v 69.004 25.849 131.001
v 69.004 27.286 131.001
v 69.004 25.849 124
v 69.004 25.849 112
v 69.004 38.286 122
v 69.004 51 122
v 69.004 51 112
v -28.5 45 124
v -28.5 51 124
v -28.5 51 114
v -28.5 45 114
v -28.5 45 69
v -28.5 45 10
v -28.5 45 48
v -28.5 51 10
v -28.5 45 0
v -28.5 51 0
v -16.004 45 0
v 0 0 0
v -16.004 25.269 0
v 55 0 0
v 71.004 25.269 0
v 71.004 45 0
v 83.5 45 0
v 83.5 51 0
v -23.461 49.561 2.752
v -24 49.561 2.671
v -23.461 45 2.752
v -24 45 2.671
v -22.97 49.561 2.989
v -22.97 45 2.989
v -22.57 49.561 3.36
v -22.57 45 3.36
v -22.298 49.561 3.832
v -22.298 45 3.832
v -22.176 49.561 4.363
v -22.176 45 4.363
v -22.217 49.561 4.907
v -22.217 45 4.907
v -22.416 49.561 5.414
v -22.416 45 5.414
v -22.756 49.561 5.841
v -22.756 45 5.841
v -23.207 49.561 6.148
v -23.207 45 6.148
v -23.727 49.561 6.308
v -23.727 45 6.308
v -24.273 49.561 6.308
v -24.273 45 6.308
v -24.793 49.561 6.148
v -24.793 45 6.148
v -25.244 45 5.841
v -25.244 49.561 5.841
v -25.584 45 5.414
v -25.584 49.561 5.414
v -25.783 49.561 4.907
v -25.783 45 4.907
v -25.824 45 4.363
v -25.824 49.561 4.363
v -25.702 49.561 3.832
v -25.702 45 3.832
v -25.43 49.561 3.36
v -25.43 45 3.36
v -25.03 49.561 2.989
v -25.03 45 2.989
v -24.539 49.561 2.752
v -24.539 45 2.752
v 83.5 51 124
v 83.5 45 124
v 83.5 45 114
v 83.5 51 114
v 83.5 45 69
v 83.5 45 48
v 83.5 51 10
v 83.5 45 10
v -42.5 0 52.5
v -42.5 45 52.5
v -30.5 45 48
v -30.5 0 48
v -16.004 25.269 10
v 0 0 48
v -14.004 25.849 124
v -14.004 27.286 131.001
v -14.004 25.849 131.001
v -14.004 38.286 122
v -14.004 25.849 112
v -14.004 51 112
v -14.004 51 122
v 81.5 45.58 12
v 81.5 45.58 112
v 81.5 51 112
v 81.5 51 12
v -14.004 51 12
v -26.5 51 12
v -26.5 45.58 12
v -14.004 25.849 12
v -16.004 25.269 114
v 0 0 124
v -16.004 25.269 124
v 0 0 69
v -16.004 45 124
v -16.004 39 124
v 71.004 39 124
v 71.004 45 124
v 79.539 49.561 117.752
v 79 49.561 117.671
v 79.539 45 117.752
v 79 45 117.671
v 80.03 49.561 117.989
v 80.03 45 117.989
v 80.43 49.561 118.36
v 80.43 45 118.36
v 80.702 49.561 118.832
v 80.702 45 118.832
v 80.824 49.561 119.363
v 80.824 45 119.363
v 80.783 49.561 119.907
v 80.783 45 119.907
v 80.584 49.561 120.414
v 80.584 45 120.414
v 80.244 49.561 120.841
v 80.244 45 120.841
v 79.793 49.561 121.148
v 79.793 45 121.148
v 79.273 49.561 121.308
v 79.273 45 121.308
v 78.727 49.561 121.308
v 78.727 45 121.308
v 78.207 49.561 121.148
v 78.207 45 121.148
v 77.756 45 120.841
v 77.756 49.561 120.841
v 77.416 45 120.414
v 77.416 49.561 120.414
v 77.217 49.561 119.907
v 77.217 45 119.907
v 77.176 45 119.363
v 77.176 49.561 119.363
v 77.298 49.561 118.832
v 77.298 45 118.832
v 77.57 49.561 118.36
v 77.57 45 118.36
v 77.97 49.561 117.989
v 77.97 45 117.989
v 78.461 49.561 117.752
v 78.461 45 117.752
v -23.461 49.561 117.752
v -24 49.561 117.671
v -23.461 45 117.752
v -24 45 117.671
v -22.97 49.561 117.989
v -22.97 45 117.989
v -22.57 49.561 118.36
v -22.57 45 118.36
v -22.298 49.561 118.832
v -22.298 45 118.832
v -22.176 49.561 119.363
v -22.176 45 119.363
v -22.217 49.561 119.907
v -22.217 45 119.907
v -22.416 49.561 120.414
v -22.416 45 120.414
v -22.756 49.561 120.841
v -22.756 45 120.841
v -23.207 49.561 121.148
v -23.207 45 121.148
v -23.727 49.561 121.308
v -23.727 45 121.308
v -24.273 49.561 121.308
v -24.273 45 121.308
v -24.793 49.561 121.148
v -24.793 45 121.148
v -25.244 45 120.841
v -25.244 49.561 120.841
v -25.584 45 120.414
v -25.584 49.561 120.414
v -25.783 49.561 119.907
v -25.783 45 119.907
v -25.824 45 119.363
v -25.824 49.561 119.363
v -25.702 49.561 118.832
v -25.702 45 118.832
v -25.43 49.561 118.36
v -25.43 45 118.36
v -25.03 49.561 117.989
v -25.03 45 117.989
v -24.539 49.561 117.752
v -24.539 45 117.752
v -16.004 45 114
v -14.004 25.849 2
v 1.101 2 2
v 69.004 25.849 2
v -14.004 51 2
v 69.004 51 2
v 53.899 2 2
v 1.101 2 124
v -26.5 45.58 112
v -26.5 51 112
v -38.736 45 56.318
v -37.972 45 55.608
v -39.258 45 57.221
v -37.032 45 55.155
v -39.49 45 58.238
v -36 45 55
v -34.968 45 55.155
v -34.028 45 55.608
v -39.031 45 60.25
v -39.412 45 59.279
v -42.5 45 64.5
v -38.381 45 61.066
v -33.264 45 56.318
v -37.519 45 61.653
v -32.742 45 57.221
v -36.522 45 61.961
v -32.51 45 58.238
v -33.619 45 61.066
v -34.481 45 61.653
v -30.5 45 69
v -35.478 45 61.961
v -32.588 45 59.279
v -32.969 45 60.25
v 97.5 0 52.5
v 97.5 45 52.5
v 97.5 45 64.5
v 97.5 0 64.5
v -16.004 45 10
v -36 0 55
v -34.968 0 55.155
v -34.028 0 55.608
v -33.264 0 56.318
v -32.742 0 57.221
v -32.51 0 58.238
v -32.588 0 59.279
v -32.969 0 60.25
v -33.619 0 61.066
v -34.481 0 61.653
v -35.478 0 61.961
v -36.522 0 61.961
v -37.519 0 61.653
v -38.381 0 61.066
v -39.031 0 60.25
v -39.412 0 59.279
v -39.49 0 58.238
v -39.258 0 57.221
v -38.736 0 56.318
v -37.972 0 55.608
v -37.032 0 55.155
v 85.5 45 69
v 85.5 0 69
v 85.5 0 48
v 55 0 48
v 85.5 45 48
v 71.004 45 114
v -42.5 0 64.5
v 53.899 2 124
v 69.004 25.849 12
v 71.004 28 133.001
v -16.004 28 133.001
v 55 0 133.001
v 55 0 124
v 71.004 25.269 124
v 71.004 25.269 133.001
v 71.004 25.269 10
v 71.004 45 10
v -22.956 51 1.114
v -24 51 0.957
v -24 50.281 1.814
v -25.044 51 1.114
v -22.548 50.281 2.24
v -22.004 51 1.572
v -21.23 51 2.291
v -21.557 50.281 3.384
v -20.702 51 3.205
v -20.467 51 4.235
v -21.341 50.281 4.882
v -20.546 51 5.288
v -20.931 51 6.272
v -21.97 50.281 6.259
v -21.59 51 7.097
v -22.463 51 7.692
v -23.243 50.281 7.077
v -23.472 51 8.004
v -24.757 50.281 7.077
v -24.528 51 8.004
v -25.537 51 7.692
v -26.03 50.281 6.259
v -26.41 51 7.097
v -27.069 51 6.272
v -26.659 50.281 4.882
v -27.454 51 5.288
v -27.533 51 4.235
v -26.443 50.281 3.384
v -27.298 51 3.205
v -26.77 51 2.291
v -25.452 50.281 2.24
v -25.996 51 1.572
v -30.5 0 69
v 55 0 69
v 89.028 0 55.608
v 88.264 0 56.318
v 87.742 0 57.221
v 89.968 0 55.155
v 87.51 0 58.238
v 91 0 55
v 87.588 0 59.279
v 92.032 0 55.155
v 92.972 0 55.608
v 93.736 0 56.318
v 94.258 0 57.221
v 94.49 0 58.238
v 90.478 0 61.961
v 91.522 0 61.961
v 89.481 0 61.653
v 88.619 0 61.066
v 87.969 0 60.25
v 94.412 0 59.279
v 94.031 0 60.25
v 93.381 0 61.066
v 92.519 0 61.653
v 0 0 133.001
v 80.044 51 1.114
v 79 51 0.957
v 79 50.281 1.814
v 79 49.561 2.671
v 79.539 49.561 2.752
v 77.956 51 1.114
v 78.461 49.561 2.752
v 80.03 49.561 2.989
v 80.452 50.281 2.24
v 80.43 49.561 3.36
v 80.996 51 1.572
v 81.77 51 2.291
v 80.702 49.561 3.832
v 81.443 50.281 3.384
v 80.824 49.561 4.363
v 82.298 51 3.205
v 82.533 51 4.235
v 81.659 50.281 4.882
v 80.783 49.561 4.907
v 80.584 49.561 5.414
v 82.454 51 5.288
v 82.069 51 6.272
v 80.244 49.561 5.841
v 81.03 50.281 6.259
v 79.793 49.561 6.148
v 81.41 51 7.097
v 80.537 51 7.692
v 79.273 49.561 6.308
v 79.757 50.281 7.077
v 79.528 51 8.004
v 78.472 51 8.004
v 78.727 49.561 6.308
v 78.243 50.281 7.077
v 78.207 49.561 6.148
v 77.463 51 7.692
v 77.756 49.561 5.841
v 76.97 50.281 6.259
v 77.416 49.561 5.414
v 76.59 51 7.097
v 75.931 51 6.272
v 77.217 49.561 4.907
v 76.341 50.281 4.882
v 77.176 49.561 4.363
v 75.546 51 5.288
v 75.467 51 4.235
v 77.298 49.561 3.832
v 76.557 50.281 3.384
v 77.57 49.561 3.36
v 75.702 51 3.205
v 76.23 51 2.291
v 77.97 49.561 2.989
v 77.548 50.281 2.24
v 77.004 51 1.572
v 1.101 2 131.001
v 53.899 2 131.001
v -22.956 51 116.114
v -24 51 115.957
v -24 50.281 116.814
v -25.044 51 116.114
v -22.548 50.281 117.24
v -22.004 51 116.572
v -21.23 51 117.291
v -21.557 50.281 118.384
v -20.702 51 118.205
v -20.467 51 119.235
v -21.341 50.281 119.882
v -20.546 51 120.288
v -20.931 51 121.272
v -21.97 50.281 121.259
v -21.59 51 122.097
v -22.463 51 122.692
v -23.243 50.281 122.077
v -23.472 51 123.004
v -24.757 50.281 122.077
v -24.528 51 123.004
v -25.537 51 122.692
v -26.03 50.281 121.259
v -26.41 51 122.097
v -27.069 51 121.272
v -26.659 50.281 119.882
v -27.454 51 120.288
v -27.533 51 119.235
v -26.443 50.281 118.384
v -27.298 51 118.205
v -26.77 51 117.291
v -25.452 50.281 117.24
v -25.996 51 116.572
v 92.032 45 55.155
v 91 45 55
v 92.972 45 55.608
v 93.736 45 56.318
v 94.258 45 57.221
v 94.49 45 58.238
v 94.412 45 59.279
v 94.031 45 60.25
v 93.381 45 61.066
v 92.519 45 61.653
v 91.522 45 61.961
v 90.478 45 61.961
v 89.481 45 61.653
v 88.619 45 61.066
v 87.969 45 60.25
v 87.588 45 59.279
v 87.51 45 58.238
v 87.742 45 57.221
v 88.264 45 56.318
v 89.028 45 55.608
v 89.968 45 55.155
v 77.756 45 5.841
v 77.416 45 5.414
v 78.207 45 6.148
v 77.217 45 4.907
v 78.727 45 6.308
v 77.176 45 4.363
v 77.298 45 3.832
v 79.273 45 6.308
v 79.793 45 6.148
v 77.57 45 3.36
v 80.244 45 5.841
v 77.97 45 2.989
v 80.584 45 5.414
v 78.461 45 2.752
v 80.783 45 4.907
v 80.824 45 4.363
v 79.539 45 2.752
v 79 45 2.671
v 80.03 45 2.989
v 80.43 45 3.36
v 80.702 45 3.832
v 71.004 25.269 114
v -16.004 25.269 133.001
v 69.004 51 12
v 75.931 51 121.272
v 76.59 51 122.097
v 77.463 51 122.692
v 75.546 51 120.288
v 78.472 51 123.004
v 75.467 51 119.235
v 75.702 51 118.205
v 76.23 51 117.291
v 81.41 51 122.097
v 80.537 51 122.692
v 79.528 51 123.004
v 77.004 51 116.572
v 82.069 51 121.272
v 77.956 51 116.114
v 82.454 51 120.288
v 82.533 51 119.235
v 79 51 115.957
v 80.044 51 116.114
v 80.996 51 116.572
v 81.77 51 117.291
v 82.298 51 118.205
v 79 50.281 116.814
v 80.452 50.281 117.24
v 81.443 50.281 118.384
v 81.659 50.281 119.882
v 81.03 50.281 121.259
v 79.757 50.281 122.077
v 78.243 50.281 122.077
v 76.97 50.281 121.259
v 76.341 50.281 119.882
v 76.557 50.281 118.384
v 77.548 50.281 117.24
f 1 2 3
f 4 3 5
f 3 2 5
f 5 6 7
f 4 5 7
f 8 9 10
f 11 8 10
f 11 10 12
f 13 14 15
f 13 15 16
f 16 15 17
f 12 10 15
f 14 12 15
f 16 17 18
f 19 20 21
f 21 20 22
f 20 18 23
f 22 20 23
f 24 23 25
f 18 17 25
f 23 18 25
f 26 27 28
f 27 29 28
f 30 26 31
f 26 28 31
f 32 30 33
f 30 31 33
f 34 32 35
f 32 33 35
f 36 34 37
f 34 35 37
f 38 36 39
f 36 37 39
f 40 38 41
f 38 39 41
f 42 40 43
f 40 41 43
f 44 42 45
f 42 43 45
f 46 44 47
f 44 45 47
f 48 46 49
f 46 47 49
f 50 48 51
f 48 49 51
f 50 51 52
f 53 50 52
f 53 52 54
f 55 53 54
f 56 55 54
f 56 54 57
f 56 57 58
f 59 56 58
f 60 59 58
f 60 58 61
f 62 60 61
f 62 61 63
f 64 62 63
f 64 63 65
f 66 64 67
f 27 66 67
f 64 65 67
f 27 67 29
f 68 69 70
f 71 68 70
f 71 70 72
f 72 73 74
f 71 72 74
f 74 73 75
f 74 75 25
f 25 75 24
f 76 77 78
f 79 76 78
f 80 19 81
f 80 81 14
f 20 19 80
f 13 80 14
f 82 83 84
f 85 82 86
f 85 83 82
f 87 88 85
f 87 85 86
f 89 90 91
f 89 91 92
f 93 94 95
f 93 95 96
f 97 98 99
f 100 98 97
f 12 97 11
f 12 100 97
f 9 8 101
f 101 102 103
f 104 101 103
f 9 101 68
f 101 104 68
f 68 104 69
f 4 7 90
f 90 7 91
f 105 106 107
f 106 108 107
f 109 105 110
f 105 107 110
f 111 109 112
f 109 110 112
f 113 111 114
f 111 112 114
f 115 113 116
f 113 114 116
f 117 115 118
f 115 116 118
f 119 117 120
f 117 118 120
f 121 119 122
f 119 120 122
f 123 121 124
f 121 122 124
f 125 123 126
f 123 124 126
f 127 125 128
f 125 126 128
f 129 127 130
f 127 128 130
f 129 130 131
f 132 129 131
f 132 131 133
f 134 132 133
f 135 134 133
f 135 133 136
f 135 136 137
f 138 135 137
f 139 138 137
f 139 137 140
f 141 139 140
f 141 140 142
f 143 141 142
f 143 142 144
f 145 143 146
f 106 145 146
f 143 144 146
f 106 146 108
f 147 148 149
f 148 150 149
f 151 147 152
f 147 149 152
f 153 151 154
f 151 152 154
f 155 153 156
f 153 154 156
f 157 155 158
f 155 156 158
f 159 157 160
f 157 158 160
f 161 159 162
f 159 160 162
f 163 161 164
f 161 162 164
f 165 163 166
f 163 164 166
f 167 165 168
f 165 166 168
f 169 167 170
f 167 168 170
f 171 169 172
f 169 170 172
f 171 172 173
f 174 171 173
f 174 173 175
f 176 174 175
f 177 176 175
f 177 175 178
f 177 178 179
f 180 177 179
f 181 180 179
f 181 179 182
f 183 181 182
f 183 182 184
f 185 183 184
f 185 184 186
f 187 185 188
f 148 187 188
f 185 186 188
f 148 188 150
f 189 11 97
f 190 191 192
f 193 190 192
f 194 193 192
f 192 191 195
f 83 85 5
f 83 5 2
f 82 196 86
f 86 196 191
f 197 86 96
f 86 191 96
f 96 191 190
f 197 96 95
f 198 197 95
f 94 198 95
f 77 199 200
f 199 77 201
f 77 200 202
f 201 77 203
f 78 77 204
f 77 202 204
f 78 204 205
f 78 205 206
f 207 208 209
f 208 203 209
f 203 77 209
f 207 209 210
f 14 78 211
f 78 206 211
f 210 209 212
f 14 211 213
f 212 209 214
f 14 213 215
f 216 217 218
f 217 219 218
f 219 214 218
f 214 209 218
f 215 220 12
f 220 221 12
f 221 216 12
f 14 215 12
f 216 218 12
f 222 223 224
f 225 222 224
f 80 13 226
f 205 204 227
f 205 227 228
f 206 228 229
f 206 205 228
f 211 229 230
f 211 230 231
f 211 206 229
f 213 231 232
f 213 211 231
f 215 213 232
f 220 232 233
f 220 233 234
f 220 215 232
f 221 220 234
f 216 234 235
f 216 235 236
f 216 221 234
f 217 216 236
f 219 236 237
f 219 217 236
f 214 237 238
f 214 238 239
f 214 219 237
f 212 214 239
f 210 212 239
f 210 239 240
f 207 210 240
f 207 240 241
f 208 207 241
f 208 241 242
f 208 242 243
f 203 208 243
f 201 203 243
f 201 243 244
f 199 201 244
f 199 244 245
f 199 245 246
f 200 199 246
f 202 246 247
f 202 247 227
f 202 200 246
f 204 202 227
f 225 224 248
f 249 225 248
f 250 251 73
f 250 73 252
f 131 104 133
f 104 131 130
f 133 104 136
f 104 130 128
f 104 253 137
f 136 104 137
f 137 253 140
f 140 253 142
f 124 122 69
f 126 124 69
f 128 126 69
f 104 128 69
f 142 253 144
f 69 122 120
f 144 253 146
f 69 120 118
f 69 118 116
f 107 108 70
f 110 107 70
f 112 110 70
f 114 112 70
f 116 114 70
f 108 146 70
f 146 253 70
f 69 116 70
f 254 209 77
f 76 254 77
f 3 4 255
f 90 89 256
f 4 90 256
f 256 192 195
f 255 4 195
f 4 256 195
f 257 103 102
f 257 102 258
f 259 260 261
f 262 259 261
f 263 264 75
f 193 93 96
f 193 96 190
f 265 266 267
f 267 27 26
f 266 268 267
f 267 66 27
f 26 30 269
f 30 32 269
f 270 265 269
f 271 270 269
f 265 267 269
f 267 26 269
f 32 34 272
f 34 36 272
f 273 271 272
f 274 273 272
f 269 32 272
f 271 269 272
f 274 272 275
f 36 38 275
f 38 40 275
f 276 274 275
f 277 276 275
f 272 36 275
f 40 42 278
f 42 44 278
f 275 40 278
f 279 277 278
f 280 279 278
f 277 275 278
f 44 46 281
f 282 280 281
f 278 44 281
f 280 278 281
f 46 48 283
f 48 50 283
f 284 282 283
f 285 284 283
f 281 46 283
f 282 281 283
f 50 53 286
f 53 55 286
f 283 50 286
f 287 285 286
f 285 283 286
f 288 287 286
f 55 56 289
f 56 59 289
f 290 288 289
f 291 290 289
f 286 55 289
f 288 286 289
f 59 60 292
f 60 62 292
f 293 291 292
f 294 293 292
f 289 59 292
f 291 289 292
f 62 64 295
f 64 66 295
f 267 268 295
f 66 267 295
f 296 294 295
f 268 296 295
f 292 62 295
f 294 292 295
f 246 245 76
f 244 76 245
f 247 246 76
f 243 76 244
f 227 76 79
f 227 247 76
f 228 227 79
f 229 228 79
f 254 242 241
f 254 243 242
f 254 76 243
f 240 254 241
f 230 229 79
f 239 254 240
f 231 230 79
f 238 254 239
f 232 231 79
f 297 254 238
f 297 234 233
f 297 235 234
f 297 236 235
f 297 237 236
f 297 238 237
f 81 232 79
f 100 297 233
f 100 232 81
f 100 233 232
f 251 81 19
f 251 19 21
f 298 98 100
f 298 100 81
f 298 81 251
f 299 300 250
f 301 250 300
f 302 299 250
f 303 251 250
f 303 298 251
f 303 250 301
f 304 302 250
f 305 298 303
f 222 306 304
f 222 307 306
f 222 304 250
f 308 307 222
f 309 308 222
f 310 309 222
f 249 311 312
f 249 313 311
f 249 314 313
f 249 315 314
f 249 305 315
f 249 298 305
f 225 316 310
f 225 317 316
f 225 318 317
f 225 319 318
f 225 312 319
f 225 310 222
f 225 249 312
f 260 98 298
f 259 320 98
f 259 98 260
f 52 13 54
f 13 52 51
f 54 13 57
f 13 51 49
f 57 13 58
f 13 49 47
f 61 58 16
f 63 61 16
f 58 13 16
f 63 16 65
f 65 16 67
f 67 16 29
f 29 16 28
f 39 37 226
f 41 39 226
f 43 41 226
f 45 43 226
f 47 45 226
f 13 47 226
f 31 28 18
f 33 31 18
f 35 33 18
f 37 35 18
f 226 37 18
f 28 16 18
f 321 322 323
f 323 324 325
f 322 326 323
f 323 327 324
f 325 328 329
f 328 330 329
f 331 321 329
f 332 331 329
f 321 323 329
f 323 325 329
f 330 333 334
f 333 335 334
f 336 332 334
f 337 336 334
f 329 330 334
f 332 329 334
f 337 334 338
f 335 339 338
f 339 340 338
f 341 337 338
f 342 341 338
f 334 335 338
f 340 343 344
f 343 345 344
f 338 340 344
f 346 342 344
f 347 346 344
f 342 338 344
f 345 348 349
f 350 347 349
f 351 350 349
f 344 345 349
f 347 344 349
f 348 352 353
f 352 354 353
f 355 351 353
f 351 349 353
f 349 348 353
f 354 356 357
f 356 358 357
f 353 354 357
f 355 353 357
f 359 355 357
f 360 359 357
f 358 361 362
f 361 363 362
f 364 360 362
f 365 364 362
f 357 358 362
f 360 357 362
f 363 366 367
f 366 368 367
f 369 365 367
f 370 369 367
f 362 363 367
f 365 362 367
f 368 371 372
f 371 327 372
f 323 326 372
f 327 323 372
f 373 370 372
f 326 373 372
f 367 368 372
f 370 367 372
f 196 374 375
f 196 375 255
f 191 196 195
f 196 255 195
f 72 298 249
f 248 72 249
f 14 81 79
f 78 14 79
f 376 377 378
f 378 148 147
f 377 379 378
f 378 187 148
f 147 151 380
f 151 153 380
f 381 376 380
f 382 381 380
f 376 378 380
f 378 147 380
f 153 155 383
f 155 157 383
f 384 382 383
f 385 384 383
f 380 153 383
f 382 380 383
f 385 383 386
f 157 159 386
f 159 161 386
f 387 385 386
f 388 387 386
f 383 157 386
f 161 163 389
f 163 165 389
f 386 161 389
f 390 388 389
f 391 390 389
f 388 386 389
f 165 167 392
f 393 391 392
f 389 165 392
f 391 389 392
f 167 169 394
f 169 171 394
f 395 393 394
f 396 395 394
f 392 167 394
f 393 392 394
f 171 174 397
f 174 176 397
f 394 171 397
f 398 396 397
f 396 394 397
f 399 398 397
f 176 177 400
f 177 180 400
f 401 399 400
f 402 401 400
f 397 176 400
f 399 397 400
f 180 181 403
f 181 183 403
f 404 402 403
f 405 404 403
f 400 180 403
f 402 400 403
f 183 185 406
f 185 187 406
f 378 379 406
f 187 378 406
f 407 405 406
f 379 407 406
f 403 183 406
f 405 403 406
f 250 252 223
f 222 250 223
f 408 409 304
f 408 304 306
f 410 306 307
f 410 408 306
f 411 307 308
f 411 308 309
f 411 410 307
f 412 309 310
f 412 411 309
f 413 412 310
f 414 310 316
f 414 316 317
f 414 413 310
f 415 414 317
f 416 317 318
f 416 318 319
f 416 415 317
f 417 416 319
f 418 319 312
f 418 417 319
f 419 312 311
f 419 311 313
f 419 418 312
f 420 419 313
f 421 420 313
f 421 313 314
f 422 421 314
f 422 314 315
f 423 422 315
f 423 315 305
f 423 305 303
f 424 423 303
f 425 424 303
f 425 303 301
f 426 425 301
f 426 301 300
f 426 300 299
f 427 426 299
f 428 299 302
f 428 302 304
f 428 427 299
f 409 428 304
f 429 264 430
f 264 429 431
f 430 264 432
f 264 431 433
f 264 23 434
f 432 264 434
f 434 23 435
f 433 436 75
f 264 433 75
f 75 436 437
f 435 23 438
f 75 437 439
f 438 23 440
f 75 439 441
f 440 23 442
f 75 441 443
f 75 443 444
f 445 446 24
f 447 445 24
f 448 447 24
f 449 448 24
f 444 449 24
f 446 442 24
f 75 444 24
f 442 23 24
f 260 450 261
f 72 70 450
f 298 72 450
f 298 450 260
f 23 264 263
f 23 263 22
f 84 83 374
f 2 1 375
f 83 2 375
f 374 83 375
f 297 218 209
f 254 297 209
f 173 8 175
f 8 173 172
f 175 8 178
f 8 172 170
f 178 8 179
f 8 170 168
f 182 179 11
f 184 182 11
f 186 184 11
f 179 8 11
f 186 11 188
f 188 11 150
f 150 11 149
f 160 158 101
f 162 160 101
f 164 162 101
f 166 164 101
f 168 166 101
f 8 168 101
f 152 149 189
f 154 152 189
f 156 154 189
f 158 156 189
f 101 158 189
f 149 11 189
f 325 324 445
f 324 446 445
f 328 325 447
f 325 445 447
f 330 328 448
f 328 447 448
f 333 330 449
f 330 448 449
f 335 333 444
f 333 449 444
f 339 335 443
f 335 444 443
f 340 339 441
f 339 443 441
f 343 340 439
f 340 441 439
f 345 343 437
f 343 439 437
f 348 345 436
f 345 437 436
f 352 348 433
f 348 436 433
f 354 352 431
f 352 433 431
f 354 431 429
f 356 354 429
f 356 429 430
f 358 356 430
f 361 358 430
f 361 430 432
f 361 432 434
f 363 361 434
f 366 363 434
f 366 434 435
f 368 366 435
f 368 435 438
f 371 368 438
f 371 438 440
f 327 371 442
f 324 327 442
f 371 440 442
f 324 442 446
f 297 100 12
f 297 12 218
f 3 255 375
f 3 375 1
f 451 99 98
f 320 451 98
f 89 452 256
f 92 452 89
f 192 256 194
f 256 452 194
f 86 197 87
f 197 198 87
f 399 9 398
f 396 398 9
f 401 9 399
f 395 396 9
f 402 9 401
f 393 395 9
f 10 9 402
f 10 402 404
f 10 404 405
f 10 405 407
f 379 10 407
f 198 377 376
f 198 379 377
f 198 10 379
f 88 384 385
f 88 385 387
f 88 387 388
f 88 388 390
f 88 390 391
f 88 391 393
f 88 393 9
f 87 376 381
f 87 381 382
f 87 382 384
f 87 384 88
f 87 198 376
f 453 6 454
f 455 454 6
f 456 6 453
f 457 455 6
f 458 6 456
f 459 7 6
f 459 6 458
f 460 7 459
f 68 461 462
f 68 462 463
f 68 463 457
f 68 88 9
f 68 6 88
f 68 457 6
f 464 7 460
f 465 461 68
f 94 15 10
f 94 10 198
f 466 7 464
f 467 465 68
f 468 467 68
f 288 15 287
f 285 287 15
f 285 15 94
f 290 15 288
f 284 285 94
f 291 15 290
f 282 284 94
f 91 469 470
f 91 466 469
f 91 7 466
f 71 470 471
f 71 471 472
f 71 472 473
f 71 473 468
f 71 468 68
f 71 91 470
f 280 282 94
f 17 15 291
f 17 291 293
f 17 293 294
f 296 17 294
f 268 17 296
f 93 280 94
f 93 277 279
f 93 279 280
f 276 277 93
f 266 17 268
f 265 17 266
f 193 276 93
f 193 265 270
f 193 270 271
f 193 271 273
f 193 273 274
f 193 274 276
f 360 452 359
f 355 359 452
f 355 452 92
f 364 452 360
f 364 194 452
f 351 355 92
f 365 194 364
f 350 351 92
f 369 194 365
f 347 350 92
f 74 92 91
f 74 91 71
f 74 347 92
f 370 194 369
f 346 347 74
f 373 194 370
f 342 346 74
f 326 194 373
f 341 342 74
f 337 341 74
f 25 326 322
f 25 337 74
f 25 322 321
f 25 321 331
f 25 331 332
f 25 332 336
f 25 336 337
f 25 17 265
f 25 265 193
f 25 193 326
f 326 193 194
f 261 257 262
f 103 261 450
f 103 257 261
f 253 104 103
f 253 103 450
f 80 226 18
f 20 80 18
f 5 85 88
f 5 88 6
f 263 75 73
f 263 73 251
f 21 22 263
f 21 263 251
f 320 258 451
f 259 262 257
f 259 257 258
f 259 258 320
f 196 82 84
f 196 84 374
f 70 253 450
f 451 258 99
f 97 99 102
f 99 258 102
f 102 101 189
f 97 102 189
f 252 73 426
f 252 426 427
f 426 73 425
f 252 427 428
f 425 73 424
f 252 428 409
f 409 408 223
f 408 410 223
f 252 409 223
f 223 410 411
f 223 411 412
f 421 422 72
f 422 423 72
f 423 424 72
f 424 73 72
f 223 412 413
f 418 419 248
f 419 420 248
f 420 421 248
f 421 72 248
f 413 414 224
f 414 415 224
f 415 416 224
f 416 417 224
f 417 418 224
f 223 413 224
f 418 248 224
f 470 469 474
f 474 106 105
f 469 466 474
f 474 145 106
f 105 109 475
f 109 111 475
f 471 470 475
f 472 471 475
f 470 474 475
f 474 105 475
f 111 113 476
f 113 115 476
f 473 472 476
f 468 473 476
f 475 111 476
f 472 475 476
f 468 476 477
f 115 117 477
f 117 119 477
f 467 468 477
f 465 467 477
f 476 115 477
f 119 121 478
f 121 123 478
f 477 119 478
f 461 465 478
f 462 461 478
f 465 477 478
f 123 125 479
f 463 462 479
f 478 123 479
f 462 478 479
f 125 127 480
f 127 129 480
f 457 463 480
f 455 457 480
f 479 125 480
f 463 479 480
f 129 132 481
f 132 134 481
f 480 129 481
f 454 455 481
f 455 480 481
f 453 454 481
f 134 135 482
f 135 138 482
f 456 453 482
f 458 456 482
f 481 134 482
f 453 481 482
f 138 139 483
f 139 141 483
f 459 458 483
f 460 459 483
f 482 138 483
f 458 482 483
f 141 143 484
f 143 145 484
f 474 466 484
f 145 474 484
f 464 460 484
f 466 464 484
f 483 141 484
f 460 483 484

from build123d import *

# Parameters (mm, degrees)
MAIN_BODY_DEPTH                                   = 124
SKETCH38_W                                        = 112
SKETCH38_H                                        = 124
BOSS_EXTRUDE2_DEPTH                               = 6
SCREW_CUT_REACH                                   = 159.953
SKETCH22_W                                        = 12.496184963
SKETCH22_H                                        = 10
BOX_START                                         = -71.003815
BOX_EXTENSION_DEPTH                               = 87.00763
CUT_EXTRUDE1_DEPTH                                = 158.953315888
INNER_SHELL_T                                     = -2
ANGLE_SUPPORTS_DEPTH                              = 21
SCREW_START                                       = -45
SKETCH9_R                                         = 3.5
SKETCH9_W                                         = 2
SKETCH9_H                                         = 21
SCREW_SUPPORT_DEPTH                               = 45
SKETCH14_W                                        = 12.496184963
SKETCH14_H                                        = 10
BOX_SCREW_SUPPORT_DEPTH                           = 6
CSK_FOR_6_FLAT_HEAD_MACHINE_SCREW_100_D           = 3.6576
CSK_FOR_6_FLAT_HEAD_MACHINE_SCREW_100_CSINK_D     = 7.0866
CSK_FOR_6_FLAT_HEAD_MACHINE_SCREW_100_CSINK_ANGLE = 100
LPATTERN1_COUNT                                   = 2
LPATTERN1_PITCH                                   = 103
LPATTERN1_COUNT_DIR2                              = 2
LPATTERN1_PITCH_DIR2                              = 115


with BuildPart() as part:
    # Front face → Main Body (new body)
    with BuildSketch(Plane.XY):
        Polygon((-28.5, 45), (83.5, 45), (55, 0), (0, 0), align=None)
    extrude(amount=MAIN_BODY_DEPTH)

    # Sketch38 → Boss-Extrude2 (add)
    with BuildSketch(Plane(origin=(0, 45, 0), x_dir=(1, 0, 0), z_dir=(0, 1, 0))):
        with Locations((27.5, -62)):
            Rectangle(SKETCH38_W, SKETCH38_H)
    extrude(amount=BOSS_EXTRUDE2_DEPTH)

    # Sketch22 → Screw Cut (cut, up to next)
    with BuildSketch(Plane(origin=(0, 51, 0), x_dir=(1, 0, 0), z_dir=(0, 1, 0)), mode=Mode.PRIVATE) as screw_cut_sk1:
        with Locations((-22.251907519, -5)):
            Rectangle(SKETCH22_W, SKETCH22_H)
    screw_cut_tool1 = extrude(screw_cut_sk1.sketch, amount=-SCREW_CUT_REACH, mode=Mode.PRIVATE) & part.part
    # Sketch22 → Screw Cut (cut, up to next)
    with BuildSketch(Plane(origin=(0, 51, 0), x_dir=(1, 0, 0), z_dir=(0, 1, 0)), mode=Mode.PRIVATE) as screw_cut_sk2:
        with Locations((77.251907519, -5)):
            Rectangle(SKETCH22_W, SKETCH22_H)
    screw_cut_tool2 = extrude(screw_cut_sk2.sketch, amount=-SCREW_CUT_REACH, mode=Mode.PRIVATE) & part.part
    # Sketch22 → Screw Cut (cut, up to next)
    with BuildSketch(Plane(origin=(0, 51, 0), x_dir=(1, 0, 0), z_dir=(0, 1, 0)), mode=Mode.PRIVATE) as screw_cut_sk3:
        with Locations((77.251907519, -119)):
            Rectangle(SKETCH22_W, SKETCH22_H)
    screw_cut_tool3 = extrude(screw_cut_sk3.sketch, amount=-SCREW_CUT_REACH, mode=Mode.PRIVATE) & part.part
    # Sketch22 → Screw Cut (cut, up to next)
    with BuildSketch(Plane(origin=(0, 51, 0), x_dir=(1, 0, 0), z_dir=(0, 1, 0)), mode=Mode.PRIVATE) as screw_cut_sk4:
        with Locations((-22.251907519, -119)):
            Rectangle(SKETCH22_W, SKETCH22_H)
    screw_cut_tool4 = extrude(screw_cut_sk4.sketch, amount=-SCREW_CUT_REACH, mode=Mode.PRIVATE) & part.part
    add(screw_cut_tool1.solids().sort_by_distance((-22.251908, 51, 5))[0], mode=Mode.SUBTRACT)
    add(screw_cut_tool2.solids().sort_by_distance((77.251908, 51, 5))[0], mode=Mode.SUBTRACT)
    add(screw_cut_tool3.solids().sort_by_distance((77.251908, 51, 119))[0], mode=Mode.SUBTRACT)
    add(screw_cut_tool4.solids().sort_by_distance((-22.251908, 51, 119))[0], mode=Mode.SUBTRACT)

    # Sketch23 → Box Extension (add)
    with BuildSketch(Plane.ZY.offset(BOX_START)):
        Polygon((124, 0), (124, 39), (133.001495165, 28), (133.001495165, 0), align=None)
    extrude(amount=BOX_EXTENSION_DEPTH)

    # Sketch28 → Cut-Extrude1 (cut, through all)
    with BuildSketch(Plane(origin=(0, 0, 124), x_dir=(-1, 0, 0), z_dir=(0, 0, -1))):
        Polygon((-71.003815037, 0), (-55, 0), (-71.003815037, 25.269181637), align=None)
        Polygon((0, 0), (16.003815037, 0), (16.003815037, 25.269181637), align=None)
    extrude(amount=-CUT_EXTRUDE1_DEPTH, mode=Mode.SUBTRACT)

    # Inner Shell
    inner_shell_openings = [part.faces().sort_by_distance(p)[0] for p in [
        (27.5, 51, 62),
    ]]
    offset(amount=INNER_SHELL_T, openings=inner_shell_openings, kind=Kind.INTERSECTION)

    # Support → Angle supports (add)
    with BuildSketch(Plane(origin=(0, 0, 48), x_dir=(-1, 0, 0), z_dir=(0, 0, -1))):
        Polygon((0, 0), (28.5, 0), (28.5, 45), align=None)
        Polygon((-83.5, 45), (-55, 0), (-83.5, 0), align=None)
    extrude(amount=-ANGLE_SUPPORTS_DEPTH)

    # Sketch9 → Screw Support (add)
    # profile 1 of 4: a face of its own
    with BuildSketch(Plane.XZ.offset(SCREW_START)):
        Polygon((97.5, 64.5), (85.5, 69), (85.5, 48), (97.5, 52.5), align=None)
        with Locations(Location((91, 58.5, 0), (0, 0, 270))):
            Circle(SKETCH9_R, mode=Mode.SUBTRACT)
    # profile 2 of 4: a face of its own
    with BuildSketch(Plane.XZ.offset(SCREW_START)):
        with Locations((84.5, 58.5)):
            Rectangle(SKETCH9_W, SKETCH9_H)
    # profile 3 of 4: a face of its own
    with BuildSketch(Plane.XZ.offset(SCREW_START)):
        Polygon((-42.5, 52.5), (-30.5, 48), (-30.5, 69), (-42.5, 64.5), align=None)
        with Locations(Location((-36, 58.5, 0), (0, 0, 270))):
            Circle(SKETCH9_R, mode=Mode.SUBTRACT)
    # profile 4 of 4: a face of its own
    with BuildSketch(Plane.XZ.offset(SCREW_START)):
        with Locations((-29.5, 58.5)):
            Rectangle(SKETCH9_W, SKETCH9_H)
    extrude(amount=SCREW_SUPPORT_DEPTH)

    # Sketch14 → Box Screw support (add)
    with BuildSketch(Plane(origin=(0, 51, 0), x_dir=(1, 0, 0), z_dir=(0, 1, 0))):
        with Locations((-22.251907519, -5)):
            Rectangle(SKETCH14_W, SKETCH14_H)
        with Locations((77.251907519, -5)):
            Rectangle(SKETCH14_W, SKETCH14_H)
        with Locations((77.251907519, -119)):
            Rectangle(SKETCH14_W, SKETCH14_H)
        with Locations((-22.251907519, -119)):
            Rectangle(SKETCH14_W, SKETCH14_H)
    extrude(amount=-BOX_SCREW_SUPPORT_DEPTH)

    # CSK for #6 Flat Head Machine Screw (100)3 (through all)
    with Locations(Plane(origin=(-24, 51, 119.5), x_dir=(0, 0, 1), z_dir=(0, 1, 0))):
        with Locations((0, 0)):
            csk_for_6_flat_head_machine_screw_100 = CounterSinkHole(CSK_FOR_6_FLAT_HEAD_MACHINE_SCREW_100_D / 2, CSK_FOR_6_FLAT_HEAD_MACHINE_SCREW_100_CSINK_D / 2, counter_sink_angle=CSK_FOR_6_FLAT_HEAD_MACHINE_SCREW_100_CSINK_ANGLE)

    # LPattern1: CSK for _6 Flat Head Machine Screw _100 2 × 2
    with Locations(*[(i * LPATTERN1_PITCH, 0, -j * LPATTERN1_PITCH_DIR2) for i in range(LPATTERN1_COUNT) for j in range(LPATTERN1_COUNT_DIR2) if (i, j) != (0, 0)]):
        add(csk_for_6_flat_head_machine_screw_100, mode=Mode.SUBTRACT)


solid = part.part
